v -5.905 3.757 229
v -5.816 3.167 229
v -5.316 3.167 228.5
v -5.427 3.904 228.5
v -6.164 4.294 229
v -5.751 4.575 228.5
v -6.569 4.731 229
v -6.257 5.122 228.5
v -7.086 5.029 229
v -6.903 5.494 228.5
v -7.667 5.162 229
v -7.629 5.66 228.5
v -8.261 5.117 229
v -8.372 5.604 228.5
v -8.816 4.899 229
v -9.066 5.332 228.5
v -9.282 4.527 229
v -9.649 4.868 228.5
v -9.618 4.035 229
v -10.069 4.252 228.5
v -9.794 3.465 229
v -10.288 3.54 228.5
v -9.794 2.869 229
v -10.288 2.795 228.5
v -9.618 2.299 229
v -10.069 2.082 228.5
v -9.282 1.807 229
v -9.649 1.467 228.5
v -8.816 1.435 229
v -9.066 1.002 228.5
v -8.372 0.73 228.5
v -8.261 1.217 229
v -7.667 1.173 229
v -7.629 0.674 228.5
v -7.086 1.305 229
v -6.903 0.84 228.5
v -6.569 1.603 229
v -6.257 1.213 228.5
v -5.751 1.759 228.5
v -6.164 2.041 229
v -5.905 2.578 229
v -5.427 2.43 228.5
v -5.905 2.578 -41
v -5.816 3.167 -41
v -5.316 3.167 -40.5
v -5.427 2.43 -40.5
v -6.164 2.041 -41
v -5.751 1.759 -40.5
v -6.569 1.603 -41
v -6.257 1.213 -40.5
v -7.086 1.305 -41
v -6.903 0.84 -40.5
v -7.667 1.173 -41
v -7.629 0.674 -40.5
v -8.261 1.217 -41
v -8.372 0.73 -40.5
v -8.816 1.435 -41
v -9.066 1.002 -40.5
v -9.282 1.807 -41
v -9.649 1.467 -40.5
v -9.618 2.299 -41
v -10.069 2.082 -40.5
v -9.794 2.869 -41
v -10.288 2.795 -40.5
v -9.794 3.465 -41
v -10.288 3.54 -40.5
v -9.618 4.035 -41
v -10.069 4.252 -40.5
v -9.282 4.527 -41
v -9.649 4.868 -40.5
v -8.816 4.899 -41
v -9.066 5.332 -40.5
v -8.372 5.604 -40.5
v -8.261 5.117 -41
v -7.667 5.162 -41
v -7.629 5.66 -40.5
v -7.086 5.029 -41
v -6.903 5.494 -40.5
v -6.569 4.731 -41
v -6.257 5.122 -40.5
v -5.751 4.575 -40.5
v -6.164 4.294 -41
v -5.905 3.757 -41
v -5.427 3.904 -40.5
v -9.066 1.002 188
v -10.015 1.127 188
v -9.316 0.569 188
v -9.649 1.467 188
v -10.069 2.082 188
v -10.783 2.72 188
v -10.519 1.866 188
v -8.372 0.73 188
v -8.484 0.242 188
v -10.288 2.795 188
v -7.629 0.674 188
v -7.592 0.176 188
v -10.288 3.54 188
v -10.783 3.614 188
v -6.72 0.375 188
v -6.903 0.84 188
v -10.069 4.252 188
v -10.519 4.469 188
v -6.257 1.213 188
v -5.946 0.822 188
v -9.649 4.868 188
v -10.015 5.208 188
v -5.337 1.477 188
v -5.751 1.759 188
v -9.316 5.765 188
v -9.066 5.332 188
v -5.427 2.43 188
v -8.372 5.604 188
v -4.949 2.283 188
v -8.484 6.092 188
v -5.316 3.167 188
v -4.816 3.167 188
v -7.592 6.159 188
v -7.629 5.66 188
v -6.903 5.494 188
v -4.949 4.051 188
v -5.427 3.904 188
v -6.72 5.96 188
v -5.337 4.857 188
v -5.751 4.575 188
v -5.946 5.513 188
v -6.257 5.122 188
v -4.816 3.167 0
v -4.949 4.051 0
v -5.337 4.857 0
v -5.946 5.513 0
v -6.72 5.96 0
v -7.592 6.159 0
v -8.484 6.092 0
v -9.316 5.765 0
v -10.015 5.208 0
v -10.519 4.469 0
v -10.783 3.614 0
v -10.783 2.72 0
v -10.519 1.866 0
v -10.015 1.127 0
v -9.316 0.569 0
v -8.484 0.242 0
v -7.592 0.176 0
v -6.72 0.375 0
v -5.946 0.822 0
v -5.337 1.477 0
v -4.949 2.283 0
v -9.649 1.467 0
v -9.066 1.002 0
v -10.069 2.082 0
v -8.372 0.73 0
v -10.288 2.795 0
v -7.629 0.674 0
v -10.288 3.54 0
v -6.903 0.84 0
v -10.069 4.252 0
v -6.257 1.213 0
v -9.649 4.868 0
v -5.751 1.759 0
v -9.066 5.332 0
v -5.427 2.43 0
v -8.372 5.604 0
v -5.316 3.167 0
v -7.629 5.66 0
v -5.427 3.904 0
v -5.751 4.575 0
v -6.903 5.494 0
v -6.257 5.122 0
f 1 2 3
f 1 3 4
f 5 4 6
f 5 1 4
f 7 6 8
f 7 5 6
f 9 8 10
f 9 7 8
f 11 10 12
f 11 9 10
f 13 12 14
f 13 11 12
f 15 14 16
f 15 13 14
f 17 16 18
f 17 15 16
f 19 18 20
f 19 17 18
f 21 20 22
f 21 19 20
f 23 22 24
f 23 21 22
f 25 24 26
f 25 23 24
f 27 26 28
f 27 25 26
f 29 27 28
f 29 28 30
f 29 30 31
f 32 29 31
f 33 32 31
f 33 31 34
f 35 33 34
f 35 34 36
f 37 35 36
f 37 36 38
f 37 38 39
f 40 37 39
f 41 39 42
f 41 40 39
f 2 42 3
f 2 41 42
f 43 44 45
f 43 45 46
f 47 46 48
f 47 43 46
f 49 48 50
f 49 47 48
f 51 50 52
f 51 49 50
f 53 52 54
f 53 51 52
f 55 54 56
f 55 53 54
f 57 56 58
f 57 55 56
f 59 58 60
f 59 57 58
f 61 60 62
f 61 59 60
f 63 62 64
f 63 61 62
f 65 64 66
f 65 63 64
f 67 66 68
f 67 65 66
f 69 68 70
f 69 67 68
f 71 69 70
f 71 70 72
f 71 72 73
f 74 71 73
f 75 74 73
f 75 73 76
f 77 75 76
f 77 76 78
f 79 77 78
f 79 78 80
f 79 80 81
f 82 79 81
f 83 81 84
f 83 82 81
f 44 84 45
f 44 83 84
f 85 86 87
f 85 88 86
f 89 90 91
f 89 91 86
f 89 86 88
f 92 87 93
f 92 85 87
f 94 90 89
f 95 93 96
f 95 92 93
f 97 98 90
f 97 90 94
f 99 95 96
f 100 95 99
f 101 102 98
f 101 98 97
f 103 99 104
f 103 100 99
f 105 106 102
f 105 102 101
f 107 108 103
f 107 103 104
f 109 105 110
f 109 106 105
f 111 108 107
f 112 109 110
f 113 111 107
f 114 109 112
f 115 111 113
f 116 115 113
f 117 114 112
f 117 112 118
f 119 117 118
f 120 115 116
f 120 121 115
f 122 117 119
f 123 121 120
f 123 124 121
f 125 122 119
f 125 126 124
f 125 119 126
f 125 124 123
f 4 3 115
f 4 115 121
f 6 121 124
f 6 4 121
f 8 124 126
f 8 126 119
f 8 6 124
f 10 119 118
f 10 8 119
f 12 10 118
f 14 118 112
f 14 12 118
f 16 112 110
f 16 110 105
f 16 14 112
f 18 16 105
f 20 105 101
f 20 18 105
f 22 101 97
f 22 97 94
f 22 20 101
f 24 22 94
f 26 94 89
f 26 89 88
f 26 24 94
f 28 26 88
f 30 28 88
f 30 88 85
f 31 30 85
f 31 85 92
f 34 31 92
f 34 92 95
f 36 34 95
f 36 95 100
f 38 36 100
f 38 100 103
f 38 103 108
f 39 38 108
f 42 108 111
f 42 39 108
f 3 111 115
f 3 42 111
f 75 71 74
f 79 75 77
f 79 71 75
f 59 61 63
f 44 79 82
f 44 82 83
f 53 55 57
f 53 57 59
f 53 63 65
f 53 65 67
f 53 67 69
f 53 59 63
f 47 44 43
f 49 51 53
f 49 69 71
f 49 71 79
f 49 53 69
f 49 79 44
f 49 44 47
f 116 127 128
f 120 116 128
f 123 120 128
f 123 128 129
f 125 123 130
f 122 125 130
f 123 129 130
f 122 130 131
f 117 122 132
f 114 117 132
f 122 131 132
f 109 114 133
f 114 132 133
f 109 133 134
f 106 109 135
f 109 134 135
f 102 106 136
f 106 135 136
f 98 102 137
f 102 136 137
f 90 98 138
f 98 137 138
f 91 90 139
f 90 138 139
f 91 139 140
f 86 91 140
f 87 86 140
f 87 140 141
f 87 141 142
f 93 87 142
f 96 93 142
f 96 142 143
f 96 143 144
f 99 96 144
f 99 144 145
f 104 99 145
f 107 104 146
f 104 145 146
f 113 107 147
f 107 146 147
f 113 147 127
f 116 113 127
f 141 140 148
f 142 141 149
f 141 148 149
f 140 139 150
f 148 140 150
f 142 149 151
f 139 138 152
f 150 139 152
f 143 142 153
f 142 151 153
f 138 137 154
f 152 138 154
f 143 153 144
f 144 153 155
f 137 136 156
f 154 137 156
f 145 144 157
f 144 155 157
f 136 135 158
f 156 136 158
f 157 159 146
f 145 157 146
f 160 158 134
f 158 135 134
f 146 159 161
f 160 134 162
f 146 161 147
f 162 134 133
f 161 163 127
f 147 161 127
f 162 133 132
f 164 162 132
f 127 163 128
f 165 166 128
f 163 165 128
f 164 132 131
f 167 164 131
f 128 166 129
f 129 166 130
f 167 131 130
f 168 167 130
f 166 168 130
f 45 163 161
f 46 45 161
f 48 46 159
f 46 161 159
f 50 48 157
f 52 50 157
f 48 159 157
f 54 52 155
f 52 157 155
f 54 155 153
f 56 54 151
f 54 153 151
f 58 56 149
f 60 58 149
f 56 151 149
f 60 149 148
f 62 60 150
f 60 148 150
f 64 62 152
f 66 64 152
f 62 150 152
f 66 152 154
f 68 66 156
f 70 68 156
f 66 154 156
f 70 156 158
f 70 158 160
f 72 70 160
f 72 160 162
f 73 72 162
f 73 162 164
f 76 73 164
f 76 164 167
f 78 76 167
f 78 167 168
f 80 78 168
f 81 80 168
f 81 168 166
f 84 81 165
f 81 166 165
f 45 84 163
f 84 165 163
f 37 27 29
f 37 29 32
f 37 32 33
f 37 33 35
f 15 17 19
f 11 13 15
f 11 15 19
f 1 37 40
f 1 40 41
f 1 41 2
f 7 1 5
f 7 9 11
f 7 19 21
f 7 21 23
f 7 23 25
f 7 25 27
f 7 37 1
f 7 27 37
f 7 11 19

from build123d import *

# Parameters (mm, degrees)
SKETCH_1_R      = 3
EXTRUDE_1_DEPTH = 188
SKETCH_2_R      = 2.5
EXTRUDE_2_DEPTH = 41
EXTRUDE_START   = 41
SKETCH_3_R      = 2.5
EXTRUDE_3_DEPTH = 41
CHAMFER_1_SIZE  = 0.5


with BuildPart() as part:
    # 草图1 → 凸台-拉伸1 (new body)
    with BuildSketch(Plane.XY):
        with Locations((-7.816186841, 3.167153776)):
            Circle(SKETCH_1_R)
    extrude(amount=EXTRUDE_1_DEPTH)

    # 草图2 → 凸台-拉伸2 (add)
    with BuildSketch(Plane(origin=(0, 0, 0), x_dir=(-1, 0, 0), z_dir=(0, 0, -1))):
        with Locations(Location((7.816186841, 3.167153776, 0), (0, 0, 180))):
            Circle(SKETCH_2_R)
    extrude(amount=EXTRUDE_2_DEPTH)

    # 草图3 → 凸台-拉伸3 (add)
    with BuildSketch(Plane.XY.offset(188).offset(EXTRUDE_START)):
        with Locations((-7.816186841, 3.167153776)):
            Circle(SKETCH_3_R)
    extrude(amount=-EXTRUDE_3_DEPTH)

    # 倒角1
    chamfer_1_edges = [part.edges().sort_by_distance(p)[0] for p in [
        (-10.316186841, 3.167153776, 229),
        (-10.316186841, 3.167153776, -41),
    ]]
    chamfer(chamfer_1_edges, length=CHAMFER_1_SIZE)


solid = part.part
